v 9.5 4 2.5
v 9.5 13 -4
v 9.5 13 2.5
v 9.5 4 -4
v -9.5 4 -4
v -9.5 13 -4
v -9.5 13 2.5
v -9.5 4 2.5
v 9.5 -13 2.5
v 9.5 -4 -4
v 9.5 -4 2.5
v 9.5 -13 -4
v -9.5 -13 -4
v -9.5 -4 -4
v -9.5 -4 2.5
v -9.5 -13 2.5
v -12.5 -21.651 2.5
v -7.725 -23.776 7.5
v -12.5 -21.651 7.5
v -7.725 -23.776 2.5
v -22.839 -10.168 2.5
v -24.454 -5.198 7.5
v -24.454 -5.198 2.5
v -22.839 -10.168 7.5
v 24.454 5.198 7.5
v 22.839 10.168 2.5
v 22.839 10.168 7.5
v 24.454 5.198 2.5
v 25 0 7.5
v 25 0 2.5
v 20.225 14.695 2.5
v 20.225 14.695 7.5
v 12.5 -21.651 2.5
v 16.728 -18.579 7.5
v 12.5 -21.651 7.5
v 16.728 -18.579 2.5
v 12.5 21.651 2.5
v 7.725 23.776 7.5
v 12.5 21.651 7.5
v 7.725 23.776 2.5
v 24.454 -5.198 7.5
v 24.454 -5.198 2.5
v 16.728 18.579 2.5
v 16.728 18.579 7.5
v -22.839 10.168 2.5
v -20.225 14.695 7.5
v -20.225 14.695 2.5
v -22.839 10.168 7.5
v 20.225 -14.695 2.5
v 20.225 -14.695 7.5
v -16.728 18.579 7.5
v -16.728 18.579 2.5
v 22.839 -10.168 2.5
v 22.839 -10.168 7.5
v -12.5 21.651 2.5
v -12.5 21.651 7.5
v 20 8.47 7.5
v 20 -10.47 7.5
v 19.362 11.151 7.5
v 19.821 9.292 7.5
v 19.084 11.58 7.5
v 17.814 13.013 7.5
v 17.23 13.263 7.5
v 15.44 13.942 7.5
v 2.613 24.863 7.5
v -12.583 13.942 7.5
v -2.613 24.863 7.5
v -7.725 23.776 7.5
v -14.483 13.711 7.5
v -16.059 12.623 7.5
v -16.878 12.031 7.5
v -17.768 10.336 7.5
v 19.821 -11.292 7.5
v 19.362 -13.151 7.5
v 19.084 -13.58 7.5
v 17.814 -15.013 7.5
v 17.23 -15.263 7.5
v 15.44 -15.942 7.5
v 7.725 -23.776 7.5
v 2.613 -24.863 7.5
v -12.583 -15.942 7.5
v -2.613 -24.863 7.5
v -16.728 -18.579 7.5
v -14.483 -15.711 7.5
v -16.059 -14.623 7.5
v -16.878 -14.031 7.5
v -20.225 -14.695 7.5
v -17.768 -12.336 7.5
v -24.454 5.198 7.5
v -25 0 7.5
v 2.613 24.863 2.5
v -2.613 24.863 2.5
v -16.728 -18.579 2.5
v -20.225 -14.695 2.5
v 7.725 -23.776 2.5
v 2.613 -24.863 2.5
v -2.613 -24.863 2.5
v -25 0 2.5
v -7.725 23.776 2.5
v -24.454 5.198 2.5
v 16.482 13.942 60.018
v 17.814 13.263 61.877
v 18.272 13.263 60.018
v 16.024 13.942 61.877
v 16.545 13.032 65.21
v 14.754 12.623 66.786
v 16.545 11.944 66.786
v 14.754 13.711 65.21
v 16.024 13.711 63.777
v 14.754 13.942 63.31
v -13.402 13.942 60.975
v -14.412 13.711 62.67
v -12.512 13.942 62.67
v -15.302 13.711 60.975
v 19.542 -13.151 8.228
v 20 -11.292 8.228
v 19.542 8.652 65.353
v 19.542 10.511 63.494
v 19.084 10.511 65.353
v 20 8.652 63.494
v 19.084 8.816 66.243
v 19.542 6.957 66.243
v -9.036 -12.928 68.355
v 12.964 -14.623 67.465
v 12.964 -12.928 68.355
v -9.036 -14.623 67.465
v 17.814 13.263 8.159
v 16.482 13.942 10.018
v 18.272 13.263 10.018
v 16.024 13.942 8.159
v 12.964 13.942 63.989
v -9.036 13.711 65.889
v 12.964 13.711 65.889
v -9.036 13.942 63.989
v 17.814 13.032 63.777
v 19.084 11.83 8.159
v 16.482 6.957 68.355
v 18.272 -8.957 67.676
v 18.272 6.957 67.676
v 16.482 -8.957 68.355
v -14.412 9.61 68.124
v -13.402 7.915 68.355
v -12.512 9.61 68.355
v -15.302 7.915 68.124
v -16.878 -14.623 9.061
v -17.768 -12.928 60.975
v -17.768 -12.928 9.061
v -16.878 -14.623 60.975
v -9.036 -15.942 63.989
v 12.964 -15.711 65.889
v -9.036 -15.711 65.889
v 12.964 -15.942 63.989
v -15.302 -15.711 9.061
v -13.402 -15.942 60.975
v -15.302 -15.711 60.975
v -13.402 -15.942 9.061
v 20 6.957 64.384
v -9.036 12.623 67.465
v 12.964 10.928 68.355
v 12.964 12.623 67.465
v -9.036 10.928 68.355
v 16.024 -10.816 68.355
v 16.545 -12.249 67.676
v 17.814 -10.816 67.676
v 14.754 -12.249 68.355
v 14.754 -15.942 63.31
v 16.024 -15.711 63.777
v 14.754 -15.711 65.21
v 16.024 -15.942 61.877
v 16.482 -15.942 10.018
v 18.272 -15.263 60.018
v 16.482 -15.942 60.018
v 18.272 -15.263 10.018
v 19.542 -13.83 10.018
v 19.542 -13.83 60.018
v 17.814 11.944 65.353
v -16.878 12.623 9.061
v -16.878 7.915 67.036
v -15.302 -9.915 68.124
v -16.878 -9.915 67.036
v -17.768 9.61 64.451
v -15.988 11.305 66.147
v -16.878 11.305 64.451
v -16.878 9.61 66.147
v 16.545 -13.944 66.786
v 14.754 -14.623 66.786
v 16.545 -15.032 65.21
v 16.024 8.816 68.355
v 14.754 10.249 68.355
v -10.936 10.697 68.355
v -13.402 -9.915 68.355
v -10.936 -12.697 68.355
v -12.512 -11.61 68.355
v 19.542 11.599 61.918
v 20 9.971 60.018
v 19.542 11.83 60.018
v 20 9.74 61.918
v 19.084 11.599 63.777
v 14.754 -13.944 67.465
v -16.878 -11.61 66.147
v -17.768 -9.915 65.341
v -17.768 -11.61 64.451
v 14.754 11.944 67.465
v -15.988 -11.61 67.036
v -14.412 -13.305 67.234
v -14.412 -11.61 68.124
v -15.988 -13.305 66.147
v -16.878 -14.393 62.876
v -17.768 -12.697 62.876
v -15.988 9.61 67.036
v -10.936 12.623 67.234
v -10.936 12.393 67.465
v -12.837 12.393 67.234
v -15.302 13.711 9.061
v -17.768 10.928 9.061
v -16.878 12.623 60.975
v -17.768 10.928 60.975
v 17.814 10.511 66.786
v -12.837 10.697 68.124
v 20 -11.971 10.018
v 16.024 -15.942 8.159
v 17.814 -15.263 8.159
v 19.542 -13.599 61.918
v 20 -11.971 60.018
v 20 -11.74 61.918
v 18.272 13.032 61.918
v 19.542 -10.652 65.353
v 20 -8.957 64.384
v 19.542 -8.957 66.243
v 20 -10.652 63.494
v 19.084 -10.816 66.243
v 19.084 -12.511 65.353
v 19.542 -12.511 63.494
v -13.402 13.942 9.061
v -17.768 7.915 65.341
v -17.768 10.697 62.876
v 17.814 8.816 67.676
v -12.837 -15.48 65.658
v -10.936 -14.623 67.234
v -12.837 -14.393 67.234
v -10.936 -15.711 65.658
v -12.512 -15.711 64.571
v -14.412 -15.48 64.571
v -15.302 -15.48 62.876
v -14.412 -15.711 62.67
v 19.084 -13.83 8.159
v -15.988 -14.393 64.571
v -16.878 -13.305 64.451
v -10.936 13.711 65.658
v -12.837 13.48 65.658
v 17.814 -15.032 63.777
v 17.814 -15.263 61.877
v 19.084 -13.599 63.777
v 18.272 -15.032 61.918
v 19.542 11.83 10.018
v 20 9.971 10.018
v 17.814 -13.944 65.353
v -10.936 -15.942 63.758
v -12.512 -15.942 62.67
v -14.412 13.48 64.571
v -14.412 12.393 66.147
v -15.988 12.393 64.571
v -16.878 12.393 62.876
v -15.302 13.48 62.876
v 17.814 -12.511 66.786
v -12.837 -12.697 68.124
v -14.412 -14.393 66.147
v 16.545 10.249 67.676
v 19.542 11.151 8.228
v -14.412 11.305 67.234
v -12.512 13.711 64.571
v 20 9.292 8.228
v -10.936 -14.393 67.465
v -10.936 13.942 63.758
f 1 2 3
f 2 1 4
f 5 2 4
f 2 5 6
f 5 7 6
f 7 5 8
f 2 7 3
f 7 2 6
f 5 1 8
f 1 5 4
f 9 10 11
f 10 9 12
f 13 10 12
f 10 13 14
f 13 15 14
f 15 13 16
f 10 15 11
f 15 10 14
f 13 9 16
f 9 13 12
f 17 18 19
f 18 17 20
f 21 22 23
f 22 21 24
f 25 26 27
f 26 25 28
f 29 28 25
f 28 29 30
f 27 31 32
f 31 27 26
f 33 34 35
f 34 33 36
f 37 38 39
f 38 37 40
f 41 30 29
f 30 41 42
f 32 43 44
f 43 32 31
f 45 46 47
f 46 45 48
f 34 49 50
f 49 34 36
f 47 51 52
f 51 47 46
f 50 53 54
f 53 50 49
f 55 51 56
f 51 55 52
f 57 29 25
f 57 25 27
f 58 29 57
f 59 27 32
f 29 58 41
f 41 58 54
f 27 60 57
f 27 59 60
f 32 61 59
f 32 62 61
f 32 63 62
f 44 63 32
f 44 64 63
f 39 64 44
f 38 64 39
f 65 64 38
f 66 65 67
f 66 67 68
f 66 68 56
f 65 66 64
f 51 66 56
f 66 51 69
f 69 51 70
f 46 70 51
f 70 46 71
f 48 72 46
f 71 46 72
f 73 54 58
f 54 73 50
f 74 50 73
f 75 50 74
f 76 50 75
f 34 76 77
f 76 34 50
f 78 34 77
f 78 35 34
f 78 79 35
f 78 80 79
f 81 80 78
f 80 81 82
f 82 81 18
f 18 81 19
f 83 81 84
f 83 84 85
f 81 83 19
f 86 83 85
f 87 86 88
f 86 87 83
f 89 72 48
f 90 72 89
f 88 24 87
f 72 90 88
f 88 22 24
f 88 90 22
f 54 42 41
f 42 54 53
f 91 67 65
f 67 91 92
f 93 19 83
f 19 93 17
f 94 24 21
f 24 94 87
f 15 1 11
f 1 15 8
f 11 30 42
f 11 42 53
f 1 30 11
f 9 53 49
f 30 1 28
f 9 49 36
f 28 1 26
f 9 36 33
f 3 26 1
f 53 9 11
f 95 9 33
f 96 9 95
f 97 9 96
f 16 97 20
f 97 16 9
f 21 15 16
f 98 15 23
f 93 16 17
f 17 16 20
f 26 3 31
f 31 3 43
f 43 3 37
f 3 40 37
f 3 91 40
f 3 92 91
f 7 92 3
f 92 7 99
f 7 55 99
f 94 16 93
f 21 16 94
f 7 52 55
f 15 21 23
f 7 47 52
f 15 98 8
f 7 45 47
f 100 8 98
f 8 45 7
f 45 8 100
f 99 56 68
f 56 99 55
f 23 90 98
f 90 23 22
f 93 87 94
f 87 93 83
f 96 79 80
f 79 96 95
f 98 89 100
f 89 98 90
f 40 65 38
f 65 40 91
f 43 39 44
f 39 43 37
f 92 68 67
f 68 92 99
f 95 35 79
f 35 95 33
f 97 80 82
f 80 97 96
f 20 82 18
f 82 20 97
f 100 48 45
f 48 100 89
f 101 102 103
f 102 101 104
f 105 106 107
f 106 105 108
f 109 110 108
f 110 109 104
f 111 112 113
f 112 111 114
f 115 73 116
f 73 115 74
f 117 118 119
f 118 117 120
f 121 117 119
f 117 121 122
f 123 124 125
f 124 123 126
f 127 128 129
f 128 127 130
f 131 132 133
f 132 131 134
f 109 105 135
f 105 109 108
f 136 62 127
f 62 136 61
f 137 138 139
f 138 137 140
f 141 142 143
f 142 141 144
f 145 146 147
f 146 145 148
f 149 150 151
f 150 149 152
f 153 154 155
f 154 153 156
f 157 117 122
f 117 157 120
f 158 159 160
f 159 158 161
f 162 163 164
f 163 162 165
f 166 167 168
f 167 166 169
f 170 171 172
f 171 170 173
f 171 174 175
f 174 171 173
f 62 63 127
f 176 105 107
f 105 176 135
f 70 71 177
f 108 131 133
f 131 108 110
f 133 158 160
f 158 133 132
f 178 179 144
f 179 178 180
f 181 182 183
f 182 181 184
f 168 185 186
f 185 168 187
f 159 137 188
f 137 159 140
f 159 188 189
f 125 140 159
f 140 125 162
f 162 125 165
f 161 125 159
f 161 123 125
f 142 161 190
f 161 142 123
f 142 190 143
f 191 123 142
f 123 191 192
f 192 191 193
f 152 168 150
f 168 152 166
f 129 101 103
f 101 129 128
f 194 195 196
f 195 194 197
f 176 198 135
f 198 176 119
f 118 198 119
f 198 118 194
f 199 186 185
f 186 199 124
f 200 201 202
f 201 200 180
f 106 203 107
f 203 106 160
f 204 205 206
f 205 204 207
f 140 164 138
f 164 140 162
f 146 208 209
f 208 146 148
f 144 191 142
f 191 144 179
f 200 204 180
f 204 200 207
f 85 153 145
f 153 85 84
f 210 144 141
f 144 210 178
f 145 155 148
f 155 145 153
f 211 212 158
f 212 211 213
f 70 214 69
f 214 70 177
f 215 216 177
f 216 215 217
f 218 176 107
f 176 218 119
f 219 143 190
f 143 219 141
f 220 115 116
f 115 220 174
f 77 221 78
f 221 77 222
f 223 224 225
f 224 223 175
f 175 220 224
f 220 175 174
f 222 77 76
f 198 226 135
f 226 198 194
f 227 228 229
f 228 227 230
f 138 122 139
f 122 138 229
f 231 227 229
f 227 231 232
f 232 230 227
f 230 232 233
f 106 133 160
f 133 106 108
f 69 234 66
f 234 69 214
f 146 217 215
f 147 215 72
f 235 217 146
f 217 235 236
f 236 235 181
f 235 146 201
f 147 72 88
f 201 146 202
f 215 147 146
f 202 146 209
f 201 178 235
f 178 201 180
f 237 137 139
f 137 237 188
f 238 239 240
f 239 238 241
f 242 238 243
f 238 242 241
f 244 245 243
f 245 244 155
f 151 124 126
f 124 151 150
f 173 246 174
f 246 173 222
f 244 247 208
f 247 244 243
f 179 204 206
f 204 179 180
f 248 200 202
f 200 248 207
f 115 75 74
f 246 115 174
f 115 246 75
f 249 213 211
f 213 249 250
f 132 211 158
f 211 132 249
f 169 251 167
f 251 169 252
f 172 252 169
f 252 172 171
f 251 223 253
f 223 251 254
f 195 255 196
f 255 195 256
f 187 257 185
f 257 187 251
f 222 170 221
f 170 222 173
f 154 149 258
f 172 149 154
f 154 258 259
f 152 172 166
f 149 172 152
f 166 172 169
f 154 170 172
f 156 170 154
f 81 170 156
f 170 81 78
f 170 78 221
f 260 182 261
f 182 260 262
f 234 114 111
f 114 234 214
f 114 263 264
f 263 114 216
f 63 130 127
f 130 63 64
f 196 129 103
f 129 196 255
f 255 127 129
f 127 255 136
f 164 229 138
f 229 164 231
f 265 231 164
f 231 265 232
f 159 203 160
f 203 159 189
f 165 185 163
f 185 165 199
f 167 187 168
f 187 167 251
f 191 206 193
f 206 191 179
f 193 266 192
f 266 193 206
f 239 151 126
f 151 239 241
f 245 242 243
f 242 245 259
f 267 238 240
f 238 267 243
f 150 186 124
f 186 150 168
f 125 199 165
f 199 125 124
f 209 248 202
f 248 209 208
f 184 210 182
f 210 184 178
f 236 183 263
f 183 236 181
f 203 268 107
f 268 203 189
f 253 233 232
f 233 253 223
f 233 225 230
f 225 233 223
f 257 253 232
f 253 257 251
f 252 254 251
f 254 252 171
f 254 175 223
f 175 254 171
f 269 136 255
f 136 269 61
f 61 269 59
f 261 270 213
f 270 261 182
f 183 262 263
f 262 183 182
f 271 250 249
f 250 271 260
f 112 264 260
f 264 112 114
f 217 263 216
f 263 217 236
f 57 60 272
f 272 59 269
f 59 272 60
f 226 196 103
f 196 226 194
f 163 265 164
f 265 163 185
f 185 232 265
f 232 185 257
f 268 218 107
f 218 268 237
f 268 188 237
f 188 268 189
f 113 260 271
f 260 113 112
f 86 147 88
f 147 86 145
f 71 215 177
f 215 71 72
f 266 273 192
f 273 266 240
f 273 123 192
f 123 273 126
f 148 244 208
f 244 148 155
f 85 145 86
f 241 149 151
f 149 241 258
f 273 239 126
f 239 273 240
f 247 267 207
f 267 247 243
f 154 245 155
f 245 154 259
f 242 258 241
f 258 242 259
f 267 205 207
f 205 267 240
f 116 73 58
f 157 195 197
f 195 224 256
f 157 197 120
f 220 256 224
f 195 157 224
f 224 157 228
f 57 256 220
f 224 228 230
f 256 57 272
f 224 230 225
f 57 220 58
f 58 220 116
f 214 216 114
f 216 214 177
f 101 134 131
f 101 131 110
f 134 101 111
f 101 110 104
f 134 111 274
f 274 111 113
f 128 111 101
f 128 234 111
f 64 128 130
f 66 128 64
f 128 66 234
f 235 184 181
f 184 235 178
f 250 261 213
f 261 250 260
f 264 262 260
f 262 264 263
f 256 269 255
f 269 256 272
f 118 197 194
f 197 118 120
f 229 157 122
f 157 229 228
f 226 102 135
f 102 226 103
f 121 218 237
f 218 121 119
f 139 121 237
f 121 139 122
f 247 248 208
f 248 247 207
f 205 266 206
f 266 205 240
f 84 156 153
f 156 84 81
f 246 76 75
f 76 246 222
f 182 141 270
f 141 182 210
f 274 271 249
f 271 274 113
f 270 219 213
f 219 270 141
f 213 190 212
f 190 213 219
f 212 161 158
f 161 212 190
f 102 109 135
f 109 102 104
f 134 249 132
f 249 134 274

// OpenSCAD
//vacuum line tool for swimming pool
module indents() {
    translate([0,4+9/2,0]) cube([19,9,8],center=true) ;
    translate([0,-4-9/2,0]) cube([19,9,8],center=true) ;
    translate([0,0,5]) cylinder(h=5,d=50,center=true);
     translate([0,0,8]) minkowski() {
         minkowski() {
            minkowski() {
              translate([0,0,15]) cube([20,12,25],center=true) ; //handle
                union() {
                 cylinder(h=25,r=4);
                }
             rotate([0,90,0]) cylinder(h=2,r=4);    
             
         }
        rotate([90,0,0]) cylinder(h=2,r=4);   
     }
 }
}

indents();
